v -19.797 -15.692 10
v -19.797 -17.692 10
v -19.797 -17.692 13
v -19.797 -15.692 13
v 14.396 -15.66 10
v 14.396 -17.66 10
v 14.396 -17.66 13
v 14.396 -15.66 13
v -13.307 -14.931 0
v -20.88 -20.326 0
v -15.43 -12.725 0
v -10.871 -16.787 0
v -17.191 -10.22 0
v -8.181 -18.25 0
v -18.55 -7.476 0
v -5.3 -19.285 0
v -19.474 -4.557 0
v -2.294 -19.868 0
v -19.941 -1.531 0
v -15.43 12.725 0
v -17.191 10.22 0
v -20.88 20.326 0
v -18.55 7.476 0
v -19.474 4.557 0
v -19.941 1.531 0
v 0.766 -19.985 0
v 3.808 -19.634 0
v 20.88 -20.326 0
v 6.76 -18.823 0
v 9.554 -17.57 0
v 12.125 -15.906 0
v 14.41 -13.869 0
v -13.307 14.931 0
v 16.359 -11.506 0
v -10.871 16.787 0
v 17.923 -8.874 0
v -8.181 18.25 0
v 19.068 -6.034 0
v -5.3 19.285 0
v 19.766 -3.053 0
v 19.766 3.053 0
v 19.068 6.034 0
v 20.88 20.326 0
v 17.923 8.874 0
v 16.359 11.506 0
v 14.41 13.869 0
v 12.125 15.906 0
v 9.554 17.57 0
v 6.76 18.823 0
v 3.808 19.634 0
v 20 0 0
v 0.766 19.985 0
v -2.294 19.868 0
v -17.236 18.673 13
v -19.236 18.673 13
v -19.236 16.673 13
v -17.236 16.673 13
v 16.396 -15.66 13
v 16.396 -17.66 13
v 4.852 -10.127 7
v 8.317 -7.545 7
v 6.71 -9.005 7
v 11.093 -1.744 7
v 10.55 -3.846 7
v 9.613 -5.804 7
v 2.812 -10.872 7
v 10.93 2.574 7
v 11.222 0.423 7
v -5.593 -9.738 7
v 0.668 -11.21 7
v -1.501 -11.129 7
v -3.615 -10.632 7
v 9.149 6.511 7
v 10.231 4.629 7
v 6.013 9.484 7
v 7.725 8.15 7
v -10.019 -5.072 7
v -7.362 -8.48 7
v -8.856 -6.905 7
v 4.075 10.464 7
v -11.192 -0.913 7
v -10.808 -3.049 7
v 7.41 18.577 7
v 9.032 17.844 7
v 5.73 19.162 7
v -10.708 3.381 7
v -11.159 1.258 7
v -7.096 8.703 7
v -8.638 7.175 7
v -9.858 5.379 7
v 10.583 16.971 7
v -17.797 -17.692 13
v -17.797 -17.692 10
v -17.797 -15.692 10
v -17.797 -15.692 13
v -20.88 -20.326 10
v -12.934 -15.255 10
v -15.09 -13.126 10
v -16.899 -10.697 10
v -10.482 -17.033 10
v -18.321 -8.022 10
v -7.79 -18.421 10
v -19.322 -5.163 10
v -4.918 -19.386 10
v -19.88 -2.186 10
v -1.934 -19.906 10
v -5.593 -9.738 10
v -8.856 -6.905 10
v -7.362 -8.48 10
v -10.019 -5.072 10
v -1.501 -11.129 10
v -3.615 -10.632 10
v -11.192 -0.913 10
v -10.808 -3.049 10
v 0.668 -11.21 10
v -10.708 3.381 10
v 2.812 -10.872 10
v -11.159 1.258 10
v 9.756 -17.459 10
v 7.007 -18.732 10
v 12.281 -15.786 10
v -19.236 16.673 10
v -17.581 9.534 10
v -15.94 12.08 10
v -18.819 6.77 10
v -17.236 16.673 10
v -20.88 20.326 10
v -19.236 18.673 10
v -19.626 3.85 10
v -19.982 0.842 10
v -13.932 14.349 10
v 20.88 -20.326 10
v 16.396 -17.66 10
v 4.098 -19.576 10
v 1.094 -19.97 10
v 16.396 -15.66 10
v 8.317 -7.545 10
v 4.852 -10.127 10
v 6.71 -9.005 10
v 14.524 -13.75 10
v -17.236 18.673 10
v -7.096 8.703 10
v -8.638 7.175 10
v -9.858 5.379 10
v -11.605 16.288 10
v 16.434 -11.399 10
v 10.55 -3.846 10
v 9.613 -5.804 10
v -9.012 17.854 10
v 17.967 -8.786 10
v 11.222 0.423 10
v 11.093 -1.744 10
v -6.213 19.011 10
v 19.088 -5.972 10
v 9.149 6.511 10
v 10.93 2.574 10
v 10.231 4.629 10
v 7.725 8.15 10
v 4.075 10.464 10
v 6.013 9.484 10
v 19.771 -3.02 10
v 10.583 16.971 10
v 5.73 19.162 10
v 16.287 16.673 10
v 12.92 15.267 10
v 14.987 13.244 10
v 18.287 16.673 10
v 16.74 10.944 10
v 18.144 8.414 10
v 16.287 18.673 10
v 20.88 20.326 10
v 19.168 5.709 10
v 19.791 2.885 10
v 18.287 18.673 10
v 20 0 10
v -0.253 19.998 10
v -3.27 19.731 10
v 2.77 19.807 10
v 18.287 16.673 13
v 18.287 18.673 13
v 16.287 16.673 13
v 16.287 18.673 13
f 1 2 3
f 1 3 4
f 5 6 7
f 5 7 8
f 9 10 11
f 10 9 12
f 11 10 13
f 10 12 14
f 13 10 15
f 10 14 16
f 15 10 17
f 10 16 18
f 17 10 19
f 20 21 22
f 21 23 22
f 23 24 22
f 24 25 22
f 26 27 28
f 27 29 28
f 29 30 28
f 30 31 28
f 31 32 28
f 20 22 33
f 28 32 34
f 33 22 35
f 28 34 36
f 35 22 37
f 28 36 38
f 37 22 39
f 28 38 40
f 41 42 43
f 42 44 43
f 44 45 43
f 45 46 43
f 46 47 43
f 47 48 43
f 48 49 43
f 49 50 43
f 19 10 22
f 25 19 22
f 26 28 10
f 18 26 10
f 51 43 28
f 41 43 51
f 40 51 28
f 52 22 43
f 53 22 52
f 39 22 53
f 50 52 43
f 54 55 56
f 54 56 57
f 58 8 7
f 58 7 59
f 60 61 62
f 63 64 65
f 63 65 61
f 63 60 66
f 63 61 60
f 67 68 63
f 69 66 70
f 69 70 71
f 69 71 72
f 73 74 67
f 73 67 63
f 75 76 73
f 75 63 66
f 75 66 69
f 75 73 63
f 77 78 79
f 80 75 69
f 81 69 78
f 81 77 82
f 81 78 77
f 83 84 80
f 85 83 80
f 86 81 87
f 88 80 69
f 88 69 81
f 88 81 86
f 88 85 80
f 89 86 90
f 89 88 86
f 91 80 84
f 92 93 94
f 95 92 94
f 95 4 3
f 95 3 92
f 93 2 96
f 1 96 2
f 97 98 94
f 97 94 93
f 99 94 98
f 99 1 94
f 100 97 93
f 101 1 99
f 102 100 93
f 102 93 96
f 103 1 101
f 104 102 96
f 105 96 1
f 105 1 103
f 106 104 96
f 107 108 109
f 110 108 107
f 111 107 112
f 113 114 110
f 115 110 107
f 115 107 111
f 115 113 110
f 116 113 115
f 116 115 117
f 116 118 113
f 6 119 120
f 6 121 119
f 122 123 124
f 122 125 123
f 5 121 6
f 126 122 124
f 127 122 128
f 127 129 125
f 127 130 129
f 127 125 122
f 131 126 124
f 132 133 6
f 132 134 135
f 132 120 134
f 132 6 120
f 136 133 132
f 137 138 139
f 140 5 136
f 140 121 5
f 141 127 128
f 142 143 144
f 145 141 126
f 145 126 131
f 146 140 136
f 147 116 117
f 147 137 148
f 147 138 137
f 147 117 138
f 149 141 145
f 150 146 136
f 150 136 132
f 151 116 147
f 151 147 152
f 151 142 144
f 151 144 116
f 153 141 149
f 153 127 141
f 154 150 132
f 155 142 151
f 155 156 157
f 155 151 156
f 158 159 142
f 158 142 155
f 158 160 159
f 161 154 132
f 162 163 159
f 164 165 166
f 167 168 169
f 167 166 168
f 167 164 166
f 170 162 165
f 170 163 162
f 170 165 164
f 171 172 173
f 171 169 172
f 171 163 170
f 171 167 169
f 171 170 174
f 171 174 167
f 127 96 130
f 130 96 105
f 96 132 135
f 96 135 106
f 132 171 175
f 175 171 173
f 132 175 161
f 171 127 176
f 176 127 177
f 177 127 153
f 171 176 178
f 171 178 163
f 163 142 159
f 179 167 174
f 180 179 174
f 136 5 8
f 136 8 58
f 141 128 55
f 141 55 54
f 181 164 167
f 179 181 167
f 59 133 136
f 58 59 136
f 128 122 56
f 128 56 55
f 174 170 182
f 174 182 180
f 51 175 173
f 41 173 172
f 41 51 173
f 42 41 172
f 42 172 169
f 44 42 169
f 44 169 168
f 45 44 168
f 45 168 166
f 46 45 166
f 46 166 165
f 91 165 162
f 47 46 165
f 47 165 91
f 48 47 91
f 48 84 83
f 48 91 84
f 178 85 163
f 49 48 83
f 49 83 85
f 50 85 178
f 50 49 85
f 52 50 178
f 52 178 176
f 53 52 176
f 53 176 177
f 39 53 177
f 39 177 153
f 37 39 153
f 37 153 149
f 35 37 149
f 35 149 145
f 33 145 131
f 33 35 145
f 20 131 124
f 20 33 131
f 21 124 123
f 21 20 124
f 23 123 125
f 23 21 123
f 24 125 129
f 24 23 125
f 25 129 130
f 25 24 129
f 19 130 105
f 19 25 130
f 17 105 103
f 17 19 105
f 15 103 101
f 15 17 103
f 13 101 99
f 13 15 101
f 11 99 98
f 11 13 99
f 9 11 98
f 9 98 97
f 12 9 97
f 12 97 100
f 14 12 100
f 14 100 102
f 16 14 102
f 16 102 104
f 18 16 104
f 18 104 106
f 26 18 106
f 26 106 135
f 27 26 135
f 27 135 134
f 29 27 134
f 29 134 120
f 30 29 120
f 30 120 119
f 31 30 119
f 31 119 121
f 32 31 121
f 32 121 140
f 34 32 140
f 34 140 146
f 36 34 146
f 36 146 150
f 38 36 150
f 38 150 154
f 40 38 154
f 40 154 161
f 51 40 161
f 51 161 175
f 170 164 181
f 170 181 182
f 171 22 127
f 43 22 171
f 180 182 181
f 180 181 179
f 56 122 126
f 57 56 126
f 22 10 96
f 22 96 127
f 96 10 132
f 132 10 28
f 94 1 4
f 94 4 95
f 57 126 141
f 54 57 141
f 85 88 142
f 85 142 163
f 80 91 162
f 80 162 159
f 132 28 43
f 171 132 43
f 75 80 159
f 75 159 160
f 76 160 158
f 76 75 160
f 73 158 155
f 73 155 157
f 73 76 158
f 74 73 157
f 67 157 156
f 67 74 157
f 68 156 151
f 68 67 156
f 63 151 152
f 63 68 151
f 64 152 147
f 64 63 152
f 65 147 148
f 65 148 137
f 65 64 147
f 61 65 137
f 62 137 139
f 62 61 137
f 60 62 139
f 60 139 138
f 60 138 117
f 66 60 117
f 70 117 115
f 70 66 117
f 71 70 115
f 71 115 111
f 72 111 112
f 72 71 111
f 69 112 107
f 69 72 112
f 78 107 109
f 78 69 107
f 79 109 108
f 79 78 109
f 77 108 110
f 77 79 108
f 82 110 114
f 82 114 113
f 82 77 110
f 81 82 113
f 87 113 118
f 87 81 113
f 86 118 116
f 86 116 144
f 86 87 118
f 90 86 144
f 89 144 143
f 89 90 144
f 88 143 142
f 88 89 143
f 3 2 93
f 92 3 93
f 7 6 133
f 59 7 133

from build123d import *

# Parameters (mm, degrees)
SKETCH1_W           = 41.760012726
SKETCH1_H           = 40.652739662
SKETCH1_R           = 20
BOSS_EXTRUDE1_DEPTH = 10
BOSS_EXTRUDE2_START = -3
BOSS_EXTRUDE2_DEPTH = 3
SKETCH3_W           = 2
SKETCH3_H           = 2
BOSS_EXTRUDE3_DEPTH = 3


with BuildPart() as part:
    # Sketch1 → Boss-Extrude1 (new body)
    with BuildSketch(Plane.XY):
        Rectangle(SKETCH1_W, SKETCH1_H)
        Circle(SKETCH1_R, mode=Mode.SUBTRACT)
    extrude(amount=BOSS_EXTRUDE1_DEPTH)

    # Sketch2 → Boss-Extrude2 (add)
    with BuildSketch(Plane.XY.offset(10).offset(BOSS_EXTRUDE2_START)):
        with BuildLine():
            Line((-7.096476546, 8.702942047), (5.729829486, 19.161655828))
            ThreePointArc((5.729829486, 19.161655828), (8.229395138, 18.228468275), (10.582504972, 16.970874713))
            Line((10.582504972, 16.970874713), (4.075462496, 10.463832237))
            ThreePointArc((4.075462496, 10.463832237), (1.74837497, -11.092536437), (-7.096476546, 8.702942047))
        make_face()
    extrude(amount=BOSS_EXTRUDE2_DEPTH)

    # Sketch3 → Boss-Extrude3 (add)
    with BuildSketch(Plane.XY.offset(10)):
        with Locations((15.395513793, -16.659790737)):
            Rectangle(SKETCH3_W, SKETCH3_H)
        with Locations((17.287307426, 17.672760389)):
            Rectangle(SKETCH3_W, SKETCH3_H)
        with Locations((-18.796904472, -16.691717232)):
            Rectangle(SKETCH3_W, SKETCH3_H)
        with Locations((-18.236373025, 17.672760389)):
            Rectangle(SKETCH3_W, SKETCH3_H)
    extrude(amount=BOSS_EXTRUDE3_DEPTH)


solid = part.part
